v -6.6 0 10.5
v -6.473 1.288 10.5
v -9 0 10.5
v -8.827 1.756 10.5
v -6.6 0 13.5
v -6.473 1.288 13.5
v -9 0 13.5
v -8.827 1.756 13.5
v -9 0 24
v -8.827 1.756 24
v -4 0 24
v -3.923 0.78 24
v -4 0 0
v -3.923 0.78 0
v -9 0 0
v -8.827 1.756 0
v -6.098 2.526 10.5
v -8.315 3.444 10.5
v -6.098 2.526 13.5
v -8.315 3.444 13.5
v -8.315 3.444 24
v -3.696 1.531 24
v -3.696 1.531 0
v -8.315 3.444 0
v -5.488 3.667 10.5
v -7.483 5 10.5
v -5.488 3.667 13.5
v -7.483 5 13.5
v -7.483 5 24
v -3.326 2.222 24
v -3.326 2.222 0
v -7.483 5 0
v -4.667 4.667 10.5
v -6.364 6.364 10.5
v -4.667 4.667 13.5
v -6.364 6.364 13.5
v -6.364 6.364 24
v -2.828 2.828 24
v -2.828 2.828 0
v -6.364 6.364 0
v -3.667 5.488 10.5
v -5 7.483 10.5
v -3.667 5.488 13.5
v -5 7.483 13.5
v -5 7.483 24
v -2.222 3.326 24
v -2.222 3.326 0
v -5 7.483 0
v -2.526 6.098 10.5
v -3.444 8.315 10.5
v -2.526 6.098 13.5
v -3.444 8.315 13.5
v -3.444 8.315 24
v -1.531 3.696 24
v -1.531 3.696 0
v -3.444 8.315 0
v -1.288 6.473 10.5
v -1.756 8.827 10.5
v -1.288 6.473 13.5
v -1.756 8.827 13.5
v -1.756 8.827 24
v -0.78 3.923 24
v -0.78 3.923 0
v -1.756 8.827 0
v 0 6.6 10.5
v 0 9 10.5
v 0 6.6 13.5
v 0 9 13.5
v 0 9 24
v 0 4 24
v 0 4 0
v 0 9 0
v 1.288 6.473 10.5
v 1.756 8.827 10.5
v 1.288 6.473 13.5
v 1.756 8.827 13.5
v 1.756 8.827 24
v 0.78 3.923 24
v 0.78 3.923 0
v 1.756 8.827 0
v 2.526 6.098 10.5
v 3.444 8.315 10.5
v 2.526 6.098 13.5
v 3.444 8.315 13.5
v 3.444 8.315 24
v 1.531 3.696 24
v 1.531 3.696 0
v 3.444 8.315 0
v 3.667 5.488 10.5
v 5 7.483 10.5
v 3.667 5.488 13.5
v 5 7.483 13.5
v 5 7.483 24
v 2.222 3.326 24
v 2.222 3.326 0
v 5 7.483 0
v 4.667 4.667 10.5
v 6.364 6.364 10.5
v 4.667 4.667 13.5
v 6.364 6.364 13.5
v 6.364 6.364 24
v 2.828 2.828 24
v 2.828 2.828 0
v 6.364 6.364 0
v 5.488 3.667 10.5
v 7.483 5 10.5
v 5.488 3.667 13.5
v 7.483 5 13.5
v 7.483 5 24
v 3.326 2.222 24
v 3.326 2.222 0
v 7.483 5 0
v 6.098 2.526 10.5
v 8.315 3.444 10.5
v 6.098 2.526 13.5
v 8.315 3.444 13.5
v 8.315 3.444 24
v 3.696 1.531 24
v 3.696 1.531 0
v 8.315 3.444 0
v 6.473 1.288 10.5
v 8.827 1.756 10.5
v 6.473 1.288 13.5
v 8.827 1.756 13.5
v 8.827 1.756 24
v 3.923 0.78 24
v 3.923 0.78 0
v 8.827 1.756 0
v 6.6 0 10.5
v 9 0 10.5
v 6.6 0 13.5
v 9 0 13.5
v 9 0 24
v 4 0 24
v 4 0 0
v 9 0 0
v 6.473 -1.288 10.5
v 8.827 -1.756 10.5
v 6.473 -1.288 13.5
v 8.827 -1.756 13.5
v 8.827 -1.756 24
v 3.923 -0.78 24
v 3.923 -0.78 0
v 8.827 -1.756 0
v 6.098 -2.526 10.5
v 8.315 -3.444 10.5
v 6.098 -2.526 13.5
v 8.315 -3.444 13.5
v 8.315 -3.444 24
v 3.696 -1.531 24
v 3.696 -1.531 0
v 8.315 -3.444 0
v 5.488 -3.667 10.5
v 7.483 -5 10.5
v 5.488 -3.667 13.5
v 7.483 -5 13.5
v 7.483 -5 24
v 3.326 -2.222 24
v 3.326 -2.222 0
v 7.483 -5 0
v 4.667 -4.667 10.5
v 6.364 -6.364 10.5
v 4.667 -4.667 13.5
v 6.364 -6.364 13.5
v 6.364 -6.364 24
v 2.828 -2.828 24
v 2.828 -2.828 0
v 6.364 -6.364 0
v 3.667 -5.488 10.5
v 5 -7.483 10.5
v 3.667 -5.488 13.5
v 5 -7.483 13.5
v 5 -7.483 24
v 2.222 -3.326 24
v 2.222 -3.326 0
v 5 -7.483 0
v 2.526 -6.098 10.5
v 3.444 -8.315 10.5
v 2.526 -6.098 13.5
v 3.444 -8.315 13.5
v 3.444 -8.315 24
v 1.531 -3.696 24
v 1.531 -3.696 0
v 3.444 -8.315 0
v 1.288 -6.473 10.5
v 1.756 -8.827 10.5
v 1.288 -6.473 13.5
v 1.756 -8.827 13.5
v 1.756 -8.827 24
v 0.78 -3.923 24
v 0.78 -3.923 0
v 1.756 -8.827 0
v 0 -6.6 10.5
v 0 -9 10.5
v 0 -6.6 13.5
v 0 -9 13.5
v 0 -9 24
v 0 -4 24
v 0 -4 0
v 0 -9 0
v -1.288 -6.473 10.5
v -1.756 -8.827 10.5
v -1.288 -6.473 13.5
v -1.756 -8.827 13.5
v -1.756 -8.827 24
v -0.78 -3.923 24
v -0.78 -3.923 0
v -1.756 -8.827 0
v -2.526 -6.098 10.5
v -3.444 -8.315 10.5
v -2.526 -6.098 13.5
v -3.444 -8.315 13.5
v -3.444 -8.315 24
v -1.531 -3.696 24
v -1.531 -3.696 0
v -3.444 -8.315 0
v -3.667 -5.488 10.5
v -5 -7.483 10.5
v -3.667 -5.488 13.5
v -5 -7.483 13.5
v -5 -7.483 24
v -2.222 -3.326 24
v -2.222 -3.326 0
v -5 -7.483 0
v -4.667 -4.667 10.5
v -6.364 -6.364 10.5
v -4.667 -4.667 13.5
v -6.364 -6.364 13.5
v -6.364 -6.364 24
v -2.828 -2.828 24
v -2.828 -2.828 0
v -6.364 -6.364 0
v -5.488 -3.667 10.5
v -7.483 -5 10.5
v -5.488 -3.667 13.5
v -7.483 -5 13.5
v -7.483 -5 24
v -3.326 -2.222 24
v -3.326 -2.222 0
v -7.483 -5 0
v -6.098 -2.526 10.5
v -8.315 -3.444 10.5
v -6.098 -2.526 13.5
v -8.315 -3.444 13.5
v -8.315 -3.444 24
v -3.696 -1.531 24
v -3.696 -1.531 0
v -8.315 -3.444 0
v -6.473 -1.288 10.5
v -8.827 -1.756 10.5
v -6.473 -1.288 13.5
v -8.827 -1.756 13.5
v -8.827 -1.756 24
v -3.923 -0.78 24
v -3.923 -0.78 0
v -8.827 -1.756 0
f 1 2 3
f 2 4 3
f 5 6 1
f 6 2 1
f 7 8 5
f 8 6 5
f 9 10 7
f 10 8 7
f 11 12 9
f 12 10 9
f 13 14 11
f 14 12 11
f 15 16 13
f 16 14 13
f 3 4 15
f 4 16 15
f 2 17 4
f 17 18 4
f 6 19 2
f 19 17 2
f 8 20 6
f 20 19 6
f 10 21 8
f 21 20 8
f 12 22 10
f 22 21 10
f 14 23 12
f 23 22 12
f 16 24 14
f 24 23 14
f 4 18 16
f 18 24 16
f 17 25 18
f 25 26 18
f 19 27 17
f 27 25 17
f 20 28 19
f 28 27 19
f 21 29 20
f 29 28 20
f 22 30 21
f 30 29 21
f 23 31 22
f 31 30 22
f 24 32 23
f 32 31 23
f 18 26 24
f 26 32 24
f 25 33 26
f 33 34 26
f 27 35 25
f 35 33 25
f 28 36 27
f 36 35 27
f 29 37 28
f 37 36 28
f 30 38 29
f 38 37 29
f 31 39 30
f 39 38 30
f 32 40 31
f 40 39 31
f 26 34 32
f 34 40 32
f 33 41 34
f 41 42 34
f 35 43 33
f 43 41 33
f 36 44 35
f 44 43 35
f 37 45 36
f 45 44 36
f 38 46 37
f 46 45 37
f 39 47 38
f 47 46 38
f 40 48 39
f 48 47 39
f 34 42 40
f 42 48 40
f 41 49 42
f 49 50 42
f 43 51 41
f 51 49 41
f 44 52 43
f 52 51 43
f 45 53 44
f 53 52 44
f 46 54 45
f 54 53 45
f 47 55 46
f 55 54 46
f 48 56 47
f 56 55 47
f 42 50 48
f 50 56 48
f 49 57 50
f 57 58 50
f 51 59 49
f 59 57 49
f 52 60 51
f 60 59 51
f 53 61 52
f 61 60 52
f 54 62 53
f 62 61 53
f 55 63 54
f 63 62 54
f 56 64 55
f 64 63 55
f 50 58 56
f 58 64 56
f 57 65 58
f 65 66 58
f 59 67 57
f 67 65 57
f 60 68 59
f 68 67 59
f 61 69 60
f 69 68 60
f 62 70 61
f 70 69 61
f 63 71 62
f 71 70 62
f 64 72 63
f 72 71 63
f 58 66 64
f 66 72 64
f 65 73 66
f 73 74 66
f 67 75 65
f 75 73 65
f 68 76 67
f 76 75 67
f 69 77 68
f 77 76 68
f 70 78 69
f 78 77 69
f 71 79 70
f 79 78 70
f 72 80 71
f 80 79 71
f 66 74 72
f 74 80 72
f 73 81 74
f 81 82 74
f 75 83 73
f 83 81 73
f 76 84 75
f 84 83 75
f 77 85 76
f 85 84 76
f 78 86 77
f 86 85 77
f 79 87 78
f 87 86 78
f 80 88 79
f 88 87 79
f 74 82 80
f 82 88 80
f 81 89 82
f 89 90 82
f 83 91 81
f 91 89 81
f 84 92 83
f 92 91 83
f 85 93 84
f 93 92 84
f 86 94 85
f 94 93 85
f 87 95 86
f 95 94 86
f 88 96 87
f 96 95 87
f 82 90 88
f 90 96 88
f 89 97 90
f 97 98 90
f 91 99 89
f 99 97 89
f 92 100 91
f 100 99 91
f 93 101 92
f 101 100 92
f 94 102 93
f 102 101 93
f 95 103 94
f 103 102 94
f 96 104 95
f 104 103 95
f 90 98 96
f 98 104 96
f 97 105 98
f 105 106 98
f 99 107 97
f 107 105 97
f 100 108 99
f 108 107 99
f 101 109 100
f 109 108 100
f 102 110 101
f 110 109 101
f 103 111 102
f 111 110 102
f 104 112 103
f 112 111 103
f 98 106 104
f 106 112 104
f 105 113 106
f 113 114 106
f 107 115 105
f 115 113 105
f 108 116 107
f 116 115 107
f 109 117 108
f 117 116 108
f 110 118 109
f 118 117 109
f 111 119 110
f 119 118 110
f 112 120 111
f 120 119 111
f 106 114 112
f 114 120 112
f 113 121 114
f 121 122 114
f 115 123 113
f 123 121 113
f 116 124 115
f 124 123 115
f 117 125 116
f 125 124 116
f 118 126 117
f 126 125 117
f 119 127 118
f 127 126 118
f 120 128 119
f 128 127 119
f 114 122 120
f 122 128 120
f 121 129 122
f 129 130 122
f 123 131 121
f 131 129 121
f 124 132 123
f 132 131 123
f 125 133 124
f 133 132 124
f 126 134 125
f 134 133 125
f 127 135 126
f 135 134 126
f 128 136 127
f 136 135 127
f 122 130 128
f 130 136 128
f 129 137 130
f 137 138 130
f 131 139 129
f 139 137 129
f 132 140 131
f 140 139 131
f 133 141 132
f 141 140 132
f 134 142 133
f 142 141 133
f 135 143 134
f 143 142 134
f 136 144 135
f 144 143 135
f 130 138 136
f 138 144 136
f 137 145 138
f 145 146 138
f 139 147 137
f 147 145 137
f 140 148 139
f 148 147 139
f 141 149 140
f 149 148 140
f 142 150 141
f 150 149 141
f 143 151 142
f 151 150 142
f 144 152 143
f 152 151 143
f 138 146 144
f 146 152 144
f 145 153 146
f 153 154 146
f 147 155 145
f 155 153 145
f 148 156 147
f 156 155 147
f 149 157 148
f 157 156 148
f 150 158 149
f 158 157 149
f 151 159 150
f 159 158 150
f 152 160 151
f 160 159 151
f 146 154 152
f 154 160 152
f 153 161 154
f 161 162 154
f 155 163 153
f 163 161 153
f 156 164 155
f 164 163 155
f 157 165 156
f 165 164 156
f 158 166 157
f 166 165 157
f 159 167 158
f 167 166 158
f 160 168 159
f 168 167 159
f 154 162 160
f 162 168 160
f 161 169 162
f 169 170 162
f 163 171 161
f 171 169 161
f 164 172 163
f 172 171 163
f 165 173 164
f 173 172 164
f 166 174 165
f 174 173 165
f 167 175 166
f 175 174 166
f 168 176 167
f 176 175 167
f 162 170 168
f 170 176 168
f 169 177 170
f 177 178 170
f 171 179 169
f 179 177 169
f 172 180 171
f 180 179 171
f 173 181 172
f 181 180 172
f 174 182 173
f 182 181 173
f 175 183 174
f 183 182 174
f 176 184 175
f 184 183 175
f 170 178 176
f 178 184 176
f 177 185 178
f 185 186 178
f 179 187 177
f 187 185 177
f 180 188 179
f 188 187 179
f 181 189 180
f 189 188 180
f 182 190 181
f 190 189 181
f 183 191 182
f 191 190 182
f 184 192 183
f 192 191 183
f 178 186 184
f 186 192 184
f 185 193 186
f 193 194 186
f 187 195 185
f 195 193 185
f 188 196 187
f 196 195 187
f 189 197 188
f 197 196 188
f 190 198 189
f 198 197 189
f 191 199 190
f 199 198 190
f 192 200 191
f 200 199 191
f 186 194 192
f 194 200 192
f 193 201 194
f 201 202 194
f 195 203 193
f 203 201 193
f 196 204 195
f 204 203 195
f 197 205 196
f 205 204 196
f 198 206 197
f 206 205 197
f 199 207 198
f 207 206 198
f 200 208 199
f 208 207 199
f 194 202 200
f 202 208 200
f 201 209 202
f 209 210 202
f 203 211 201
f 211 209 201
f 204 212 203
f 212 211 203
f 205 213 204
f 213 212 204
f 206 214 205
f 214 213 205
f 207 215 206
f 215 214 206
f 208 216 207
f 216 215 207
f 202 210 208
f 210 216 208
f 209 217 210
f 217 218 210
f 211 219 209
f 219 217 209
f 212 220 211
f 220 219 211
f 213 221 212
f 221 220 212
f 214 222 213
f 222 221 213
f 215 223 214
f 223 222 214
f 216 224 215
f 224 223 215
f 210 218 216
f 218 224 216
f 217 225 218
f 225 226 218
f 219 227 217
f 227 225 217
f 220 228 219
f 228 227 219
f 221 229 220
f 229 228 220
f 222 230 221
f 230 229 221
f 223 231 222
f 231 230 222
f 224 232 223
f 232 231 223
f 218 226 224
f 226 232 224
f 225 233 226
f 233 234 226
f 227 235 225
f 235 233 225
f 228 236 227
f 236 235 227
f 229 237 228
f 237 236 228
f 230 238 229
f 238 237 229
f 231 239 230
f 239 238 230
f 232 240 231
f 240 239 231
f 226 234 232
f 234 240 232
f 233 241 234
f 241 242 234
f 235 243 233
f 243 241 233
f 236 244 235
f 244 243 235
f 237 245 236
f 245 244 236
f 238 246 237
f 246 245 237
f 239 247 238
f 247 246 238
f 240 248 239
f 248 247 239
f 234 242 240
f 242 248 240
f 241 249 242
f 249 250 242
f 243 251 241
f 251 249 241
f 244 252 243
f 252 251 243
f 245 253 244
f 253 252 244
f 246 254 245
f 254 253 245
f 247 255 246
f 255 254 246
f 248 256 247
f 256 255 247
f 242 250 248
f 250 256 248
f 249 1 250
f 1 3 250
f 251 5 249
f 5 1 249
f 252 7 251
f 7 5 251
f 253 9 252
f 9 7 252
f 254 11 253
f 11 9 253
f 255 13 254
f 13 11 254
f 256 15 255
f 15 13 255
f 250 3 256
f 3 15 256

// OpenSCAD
$fn = 32;

// ----------------------------------------------------------------------
// Grooved revolve: plain_grooves, bore R4
// ----------------------------------------------------------------------

// --- parameters (mm) ---
bore_r = 4;               // bore radius
outer_r = 9;              // outer radius of the body
total_h = 24;             // overall height, Z
wall = 5;                 // radial wall thickness
groove_w = 3;             // groove width
groove_d = 2.4;           // groove depth
grooves = 1;              // number of outer grooves
fit_tol = 0.05;           // declared fit tolerance (prompt contract)
free_tol = 0.3;           // declared free tolerance (prompt contract)

bbox_x = 2 * outer_r;  // full diameter
bore_d = 2 * bore_r;  // bore diameter
body_d = 2 * outer_r;  // body diameter
revolve_angle = 360;  // full turn around the Z axis

profile = [[4, 0], [9, 0], [9, 10.5], [6.6, 10.5], [6.6, 13.5], [9, 13.5], [9, 24], [4, 24]];  // primary outline, 8 points, counter clockwise

// --- the one profile operation ---
rotate_extrude(angle = revolve_angle) polygon(points = profile);
